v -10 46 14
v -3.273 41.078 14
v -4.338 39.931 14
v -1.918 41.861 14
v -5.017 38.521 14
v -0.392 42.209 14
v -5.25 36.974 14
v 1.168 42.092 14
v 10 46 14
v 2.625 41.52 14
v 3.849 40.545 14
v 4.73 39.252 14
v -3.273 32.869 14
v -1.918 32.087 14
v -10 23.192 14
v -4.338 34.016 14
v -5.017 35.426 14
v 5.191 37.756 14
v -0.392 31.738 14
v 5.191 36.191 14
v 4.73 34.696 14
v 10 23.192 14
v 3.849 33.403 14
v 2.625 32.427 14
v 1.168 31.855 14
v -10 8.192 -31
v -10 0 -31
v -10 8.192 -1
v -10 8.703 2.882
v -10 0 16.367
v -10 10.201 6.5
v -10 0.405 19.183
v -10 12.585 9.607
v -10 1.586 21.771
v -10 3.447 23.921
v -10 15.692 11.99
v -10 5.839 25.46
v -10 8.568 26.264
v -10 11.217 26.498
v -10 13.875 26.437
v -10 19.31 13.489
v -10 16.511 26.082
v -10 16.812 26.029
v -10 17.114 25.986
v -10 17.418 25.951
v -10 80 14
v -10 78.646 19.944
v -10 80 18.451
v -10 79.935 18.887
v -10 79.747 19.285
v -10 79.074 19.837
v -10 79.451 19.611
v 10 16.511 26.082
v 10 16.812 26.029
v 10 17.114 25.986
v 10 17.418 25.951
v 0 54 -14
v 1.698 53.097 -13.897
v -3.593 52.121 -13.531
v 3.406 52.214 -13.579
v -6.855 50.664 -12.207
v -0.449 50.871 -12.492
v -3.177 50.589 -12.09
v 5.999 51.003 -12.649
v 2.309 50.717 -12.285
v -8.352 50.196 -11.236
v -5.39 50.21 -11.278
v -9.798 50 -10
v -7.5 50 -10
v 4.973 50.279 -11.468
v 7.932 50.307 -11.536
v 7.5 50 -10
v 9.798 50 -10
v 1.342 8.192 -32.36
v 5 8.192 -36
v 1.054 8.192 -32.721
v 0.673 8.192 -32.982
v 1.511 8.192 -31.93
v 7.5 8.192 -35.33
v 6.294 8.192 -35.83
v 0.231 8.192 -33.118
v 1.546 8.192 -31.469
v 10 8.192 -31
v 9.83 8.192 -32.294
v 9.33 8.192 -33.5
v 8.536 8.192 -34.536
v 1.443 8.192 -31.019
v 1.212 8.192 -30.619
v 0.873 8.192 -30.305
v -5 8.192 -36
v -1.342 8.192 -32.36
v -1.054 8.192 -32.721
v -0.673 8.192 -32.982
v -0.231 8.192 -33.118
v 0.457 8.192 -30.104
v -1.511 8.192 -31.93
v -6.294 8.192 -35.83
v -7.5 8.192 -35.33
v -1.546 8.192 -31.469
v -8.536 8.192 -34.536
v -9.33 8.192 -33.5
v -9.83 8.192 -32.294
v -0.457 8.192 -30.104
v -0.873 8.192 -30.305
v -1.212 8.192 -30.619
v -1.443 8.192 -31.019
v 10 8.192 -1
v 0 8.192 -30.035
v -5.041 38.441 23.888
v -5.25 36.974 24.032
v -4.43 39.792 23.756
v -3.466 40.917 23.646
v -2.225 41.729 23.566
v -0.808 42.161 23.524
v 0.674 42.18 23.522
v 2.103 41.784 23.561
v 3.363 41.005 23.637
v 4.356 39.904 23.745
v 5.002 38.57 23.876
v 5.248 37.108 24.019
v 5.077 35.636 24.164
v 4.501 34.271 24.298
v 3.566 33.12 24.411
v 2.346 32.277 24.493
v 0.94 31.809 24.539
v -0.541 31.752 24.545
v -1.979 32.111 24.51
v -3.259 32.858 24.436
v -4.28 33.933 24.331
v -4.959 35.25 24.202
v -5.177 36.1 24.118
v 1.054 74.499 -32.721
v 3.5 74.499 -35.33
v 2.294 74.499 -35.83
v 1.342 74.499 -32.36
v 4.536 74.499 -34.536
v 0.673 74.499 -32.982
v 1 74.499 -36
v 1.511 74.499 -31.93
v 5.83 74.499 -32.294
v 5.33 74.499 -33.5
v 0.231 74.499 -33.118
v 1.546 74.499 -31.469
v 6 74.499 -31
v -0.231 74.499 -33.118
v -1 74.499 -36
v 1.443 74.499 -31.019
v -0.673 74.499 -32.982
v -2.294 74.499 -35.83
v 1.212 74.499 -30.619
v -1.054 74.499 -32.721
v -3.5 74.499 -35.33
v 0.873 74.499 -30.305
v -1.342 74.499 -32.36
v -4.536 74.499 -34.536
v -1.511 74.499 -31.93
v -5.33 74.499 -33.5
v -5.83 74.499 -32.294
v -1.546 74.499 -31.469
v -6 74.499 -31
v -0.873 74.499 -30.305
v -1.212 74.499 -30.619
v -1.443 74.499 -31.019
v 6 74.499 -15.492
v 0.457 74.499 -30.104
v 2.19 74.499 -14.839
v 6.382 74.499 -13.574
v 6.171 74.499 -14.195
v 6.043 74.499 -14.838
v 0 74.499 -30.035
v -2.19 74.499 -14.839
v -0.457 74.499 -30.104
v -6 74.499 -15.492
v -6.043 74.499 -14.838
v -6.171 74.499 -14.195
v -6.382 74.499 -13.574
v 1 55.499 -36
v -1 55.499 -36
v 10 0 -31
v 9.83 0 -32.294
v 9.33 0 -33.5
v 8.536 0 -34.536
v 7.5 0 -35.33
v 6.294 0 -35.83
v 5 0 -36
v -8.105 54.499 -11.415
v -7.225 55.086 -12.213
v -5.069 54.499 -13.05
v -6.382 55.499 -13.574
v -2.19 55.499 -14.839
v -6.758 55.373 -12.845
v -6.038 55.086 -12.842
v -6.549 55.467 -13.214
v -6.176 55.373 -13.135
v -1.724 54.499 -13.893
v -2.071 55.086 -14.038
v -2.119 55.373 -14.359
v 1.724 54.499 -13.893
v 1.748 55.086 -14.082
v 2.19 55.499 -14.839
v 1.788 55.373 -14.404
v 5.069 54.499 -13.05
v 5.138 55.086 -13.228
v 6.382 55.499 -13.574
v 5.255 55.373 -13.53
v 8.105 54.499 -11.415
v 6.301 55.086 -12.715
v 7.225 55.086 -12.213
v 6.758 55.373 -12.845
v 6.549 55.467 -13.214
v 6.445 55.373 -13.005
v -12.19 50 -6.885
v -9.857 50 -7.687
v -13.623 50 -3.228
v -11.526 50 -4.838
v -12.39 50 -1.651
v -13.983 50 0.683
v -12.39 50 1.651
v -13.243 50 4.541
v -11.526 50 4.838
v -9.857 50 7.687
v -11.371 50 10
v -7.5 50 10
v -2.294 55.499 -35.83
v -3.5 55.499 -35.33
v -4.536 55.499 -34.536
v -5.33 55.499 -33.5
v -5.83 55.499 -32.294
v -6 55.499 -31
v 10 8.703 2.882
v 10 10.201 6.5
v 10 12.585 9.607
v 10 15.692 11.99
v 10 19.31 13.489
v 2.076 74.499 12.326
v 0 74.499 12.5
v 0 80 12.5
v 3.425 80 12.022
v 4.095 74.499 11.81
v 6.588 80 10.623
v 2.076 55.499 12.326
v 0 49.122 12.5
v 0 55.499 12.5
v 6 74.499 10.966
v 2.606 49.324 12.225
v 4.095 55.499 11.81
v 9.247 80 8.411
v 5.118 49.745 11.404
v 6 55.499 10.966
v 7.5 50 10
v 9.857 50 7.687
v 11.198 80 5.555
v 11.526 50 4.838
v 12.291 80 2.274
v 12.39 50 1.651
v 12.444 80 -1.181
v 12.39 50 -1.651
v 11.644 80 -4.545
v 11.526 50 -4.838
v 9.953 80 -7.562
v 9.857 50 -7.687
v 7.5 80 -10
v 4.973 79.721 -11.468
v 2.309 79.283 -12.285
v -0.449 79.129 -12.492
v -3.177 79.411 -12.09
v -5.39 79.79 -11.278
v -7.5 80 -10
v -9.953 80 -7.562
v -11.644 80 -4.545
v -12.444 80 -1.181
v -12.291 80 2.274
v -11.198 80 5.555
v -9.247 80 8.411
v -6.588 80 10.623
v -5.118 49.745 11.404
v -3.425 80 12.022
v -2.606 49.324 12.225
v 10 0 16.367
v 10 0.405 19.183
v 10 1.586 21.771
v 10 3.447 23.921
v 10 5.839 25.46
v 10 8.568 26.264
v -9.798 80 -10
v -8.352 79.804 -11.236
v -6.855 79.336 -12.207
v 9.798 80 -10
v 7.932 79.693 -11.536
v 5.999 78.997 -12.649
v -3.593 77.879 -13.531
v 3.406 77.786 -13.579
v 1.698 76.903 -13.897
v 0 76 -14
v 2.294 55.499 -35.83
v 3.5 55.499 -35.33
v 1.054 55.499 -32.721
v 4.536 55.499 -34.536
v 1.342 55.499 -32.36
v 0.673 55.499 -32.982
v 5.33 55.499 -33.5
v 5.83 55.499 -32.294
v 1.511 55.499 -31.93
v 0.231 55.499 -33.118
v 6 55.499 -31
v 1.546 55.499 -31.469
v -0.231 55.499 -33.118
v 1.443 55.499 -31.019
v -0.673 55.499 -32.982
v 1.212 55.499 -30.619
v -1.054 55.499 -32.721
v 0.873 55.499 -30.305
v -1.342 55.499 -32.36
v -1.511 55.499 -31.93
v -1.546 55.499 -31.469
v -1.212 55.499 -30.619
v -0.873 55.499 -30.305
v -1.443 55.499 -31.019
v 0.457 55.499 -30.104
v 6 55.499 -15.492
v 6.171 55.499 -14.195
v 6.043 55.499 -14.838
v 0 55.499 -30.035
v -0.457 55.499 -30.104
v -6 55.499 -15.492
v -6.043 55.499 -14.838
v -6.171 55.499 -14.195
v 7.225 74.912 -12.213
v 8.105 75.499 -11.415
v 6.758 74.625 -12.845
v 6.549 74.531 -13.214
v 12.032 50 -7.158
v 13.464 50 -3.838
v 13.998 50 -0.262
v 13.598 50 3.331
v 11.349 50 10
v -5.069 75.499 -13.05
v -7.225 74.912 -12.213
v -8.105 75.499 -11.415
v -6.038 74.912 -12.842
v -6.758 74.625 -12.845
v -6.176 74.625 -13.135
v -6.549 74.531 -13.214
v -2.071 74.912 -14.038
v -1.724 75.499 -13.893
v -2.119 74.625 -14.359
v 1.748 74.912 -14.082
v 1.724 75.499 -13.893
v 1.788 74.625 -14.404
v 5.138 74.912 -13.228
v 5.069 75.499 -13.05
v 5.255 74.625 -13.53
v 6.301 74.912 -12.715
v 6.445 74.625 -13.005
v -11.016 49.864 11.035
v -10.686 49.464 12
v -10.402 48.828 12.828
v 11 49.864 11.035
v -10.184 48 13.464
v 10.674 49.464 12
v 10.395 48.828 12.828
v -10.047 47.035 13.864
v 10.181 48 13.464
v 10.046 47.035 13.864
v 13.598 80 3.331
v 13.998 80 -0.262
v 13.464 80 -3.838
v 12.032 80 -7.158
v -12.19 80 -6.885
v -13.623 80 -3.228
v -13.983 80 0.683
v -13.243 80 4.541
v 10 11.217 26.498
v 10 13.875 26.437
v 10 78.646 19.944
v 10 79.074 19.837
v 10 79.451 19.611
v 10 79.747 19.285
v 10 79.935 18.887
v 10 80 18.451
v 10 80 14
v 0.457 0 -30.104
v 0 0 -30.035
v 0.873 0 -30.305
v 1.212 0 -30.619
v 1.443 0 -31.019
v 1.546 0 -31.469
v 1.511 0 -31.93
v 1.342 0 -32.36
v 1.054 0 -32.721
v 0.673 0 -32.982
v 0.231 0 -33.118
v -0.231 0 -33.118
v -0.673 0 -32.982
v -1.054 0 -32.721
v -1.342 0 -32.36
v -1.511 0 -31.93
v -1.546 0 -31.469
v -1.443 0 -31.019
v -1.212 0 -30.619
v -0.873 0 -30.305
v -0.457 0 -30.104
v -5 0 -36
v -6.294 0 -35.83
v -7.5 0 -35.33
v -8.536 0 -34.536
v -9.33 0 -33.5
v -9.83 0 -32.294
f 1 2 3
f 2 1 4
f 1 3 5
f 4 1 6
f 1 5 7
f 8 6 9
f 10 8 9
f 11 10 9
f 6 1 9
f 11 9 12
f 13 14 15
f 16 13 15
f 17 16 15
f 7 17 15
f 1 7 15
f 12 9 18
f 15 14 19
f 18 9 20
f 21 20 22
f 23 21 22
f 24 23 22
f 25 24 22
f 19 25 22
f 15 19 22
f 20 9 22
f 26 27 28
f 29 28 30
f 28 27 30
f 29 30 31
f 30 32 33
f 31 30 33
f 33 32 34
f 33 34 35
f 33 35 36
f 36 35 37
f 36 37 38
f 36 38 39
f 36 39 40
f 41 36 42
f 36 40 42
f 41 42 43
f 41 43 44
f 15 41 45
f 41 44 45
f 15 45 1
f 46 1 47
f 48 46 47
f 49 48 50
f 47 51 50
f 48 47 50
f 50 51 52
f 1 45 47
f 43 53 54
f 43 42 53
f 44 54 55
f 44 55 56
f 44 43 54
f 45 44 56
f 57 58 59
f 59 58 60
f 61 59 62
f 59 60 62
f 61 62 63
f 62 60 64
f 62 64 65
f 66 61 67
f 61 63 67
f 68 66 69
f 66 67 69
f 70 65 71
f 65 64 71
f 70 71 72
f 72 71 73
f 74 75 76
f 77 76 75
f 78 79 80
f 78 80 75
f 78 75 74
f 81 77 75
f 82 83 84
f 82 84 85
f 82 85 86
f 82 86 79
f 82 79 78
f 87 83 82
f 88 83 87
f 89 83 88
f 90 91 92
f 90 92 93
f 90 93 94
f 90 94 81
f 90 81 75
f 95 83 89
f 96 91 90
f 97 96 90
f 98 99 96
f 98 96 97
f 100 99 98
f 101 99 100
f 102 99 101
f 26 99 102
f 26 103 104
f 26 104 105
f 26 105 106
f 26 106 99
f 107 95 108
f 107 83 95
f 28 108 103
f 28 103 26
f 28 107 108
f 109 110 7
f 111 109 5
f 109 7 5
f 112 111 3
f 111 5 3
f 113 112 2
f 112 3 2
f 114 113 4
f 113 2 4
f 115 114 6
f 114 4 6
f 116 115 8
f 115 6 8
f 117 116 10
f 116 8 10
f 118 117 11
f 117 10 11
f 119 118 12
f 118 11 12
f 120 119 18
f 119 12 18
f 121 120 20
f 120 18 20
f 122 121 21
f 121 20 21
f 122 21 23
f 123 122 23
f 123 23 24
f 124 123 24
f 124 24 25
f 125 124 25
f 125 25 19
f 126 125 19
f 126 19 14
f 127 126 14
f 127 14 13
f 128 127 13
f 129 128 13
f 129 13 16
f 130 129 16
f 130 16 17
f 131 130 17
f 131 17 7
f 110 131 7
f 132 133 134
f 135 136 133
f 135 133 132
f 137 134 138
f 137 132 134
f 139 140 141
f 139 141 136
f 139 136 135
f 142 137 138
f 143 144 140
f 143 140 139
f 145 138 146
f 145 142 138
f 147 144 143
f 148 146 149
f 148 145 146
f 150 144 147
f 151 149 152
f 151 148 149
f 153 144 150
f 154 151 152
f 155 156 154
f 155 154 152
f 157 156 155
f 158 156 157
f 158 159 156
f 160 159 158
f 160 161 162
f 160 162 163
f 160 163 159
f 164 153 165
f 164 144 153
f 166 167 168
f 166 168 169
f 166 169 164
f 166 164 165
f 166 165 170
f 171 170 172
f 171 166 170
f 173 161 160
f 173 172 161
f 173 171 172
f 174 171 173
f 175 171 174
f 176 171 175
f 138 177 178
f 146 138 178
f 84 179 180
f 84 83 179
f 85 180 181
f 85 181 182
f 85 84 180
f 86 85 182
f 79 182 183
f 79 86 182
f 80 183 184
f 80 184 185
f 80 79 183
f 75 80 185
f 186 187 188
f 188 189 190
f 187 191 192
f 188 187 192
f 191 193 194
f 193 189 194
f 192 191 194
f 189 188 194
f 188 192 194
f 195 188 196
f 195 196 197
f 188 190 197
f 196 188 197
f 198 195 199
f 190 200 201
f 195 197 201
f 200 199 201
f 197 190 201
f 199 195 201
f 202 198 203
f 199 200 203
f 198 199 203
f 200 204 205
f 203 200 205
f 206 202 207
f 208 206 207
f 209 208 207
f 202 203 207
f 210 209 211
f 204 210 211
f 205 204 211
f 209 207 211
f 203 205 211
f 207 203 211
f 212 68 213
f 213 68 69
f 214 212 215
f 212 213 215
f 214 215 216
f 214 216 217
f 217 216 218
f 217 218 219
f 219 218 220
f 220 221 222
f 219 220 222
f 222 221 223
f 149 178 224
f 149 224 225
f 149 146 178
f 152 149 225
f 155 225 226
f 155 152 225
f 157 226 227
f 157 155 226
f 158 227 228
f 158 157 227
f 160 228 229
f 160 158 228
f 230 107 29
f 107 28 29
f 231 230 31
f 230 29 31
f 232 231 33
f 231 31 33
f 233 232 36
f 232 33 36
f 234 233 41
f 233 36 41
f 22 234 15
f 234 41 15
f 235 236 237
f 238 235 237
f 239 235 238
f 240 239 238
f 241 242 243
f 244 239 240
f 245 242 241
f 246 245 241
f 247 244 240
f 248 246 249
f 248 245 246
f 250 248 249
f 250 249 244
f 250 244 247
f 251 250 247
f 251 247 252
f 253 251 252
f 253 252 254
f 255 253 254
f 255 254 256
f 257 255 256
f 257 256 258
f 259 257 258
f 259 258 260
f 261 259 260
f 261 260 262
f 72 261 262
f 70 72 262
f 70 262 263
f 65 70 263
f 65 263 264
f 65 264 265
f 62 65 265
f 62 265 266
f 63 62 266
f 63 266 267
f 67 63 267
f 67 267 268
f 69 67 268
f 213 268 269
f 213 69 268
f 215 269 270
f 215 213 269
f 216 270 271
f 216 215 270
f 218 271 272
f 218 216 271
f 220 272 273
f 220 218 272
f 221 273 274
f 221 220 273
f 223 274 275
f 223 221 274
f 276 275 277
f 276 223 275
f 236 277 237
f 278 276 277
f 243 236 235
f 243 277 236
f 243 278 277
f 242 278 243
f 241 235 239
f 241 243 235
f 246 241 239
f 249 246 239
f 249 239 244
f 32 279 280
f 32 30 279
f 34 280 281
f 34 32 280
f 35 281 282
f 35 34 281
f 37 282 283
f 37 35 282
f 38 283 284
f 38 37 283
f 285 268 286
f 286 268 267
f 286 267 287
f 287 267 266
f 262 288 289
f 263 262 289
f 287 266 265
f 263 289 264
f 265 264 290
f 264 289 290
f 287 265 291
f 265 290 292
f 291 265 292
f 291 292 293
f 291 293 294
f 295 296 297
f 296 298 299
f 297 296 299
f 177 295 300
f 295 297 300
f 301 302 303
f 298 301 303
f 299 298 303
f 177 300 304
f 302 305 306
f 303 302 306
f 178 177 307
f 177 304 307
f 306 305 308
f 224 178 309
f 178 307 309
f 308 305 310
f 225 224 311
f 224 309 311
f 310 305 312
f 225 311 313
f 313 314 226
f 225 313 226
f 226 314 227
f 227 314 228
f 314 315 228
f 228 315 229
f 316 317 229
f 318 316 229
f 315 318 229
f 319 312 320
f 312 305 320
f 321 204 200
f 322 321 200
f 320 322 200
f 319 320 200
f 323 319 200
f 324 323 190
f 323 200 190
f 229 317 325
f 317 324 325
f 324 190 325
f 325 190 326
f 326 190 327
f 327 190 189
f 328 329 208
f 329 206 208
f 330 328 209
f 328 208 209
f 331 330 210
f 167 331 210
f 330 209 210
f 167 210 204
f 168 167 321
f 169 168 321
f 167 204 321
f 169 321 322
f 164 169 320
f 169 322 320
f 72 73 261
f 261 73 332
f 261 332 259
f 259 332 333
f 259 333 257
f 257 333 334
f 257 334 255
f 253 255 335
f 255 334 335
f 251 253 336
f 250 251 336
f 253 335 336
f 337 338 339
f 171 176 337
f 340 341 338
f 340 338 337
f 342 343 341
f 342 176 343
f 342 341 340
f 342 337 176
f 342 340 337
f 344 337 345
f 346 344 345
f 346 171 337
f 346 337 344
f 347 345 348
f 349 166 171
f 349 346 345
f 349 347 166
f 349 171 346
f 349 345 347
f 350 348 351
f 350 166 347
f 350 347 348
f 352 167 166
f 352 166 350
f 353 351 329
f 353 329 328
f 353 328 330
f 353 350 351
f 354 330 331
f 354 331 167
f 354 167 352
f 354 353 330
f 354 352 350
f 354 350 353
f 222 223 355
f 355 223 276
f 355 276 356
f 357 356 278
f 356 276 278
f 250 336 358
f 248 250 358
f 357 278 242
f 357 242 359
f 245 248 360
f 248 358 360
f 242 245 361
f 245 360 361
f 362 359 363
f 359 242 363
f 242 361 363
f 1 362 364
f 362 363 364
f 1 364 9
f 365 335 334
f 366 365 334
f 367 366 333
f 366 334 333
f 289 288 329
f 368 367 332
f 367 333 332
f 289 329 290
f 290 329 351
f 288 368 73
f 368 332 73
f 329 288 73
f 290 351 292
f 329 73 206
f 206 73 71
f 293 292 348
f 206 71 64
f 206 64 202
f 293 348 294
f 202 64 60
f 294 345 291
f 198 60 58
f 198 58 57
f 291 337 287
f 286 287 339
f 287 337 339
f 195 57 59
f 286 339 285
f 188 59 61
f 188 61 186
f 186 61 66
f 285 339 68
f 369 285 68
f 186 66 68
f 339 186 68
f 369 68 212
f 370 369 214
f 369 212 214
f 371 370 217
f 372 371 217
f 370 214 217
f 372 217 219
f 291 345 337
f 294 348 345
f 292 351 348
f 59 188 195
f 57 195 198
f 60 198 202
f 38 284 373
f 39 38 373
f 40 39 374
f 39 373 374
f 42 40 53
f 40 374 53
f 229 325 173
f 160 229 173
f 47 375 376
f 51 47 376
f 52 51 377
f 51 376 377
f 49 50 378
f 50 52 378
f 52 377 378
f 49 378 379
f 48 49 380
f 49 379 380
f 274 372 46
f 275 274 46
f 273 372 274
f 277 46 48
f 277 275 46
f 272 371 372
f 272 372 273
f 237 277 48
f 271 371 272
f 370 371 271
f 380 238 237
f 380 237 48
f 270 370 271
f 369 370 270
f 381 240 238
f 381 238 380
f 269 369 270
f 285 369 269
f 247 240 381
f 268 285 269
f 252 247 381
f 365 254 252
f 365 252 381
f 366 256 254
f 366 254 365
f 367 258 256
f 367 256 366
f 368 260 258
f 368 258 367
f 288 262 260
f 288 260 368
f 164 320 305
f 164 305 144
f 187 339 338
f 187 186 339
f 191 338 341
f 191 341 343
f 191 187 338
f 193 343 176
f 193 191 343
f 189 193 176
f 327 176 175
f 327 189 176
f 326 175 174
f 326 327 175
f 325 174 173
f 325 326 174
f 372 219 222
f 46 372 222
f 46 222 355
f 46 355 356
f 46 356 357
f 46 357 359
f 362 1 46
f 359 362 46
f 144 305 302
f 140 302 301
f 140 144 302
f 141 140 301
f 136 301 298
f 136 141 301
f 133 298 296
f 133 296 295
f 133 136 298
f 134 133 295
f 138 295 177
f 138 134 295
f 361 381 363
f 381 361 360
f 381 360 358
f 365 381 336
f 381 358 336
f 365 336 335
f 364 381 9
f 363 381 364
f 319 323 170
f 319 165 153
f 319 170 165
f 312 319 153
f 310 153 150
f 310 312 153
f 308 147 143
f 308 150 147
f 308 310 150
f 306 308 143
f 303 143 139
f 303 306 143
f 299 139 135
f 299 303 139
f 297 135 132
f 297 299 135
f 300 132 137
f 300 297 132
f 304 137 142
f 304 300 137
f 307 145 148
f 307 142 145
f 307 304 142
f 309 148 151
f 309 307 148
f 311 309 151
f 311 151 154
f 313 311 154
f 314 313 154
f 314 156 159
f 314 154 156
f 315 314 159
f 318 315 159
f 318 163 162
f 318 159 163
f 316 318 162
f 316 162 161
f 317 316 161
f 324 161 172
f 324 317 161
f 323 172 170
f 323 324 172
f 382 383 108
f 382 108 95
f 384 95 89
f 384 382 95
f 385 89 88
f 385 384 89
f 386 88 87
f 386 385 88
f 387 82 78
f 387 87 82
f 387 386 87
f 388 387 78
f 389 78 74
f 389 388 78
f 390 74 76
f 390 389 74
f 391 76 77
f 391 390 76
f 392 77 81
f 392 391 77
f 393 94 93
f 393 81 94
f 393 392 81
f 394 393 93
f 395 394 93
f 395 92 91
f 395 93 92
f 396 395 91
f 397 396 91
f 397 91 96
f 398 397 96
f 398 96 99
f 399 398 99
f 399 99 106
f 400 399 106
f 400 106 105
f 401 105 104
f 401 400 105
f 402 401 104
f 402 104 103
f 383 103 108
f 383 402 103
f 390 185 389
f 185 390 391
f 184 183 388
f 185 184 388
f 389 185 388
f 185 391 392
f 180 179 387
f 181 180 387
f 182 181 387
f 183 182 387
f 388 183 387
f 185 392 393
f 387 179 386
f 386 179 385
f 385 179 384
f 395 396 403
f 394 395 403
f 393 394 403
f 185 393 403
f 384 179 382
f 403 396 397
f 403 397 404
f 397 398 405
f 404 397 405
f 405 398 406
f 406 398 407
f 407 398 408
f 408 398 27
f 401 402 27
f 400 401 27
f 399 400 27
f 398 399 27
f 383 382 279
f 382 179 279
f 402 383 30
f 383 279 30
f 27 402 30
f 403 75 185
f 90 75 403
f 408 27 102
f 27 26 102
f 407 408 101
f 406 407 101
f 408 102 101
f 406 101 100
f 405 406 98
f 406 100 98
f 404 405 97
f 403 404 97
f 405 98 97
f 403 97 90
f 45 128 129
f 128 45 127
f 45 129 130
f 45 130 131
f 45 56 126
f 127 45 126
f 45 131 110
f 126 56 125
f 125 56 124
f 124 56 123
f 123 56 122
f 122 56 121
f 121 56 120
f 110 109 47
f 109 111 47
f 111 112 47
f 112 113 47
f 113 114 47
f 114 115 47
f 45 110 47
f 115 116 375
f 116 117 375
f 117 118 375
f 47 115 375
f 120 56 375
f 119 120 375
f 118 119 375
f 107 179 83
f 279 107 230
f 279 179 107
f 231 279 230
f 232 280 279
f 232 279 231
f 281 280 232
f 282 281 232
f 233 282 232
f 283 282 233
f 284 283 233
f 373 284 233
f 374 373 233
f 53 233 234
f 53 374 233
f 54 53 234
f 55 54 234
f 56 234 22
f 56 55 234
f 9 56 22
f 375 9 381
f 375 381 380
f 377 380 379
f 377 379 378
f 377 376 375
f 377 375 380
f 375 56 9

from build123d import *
from OCP.BRepFilletAPI import BRepFilletAPI_MakeFillet

# Parameters (mm, degrees)
SKETCH1_R               = 12.5
BOSS_EXTRUDE1_DEPTH     = 80
CUT_EXTRUDE1_DEPTH      = 88.77439656
CUT_EXTRUDE1_DEPTH_BACK = 88.77439656
SKETCH4_OUTSIDE_W       = 61.818
SKETCH4_OUTSIDE_H       = 100.83
SKETCH6_W               = 20
SKETCH6_H               = 8.19180338
SKETCH6_W_2             = 12
SKETCH6_H_2             = 19
BOSS_EXTRUDE3_DEPTH     = 50
CUT_EXTRUDE2_START      = -30
SKETCH8_R               = 12.5
CUT_EXTRUDE2_DEPTH      = 30
FILLET1_R               = 5
FILLET2_R               = 15
FILLET3_R1              = 1
FILLET3_R2              = 5
CUT_EXTRUDE4_DEPTH      = 84.91706908
CUT_EXTRUDE4_DEPTH_BACK = 84.91706908
SKETCH11_R              = 1.55
FILLET4_R               = 10
SKETCH12_R              = 5.25
CUT_EXTRUDE5_DEPTH      = 96.372952239


with BuildPart() as part:
    # Sketch1 → Boss-Extrude1 (new body)
    with BuildSketch(Plane(origin=(0, 0, 0), x_dir=(1, 0, 0), z_dir=(0, 1, 0))):
        with BuildLine():
            Line((-13.243243243, -4.540540541), (-10, -14))
            Line((-10, -14), (-10, -26.98786193))
            Line((-10, -26.98786193), (10, -26.98786193))
            Line((10, -26.98786193), (10, -14))
            Line((10, -14), (13.597983435, -3.330892747))
            ThreePointArc((13.597983435, -3.330892747), (-0.630295246, 13.985804514), (-13.243243243, -4.540540541))
        make_face()
        with Locations(Location((0, 0, 0), (0, 0, 270))):
            Circle(SKETCH1_R, mode=Mode.SUBTRACT)
    extrude(amount=BOSS_EXTRUDE1_DEPTH)

    # Sketch4 outside → Cut-Extrude1 (cut, two sides: drawn at the far end of the back side and taken through both)
    with BuildSketch(Plane.ZY.offset(10).offset(-CUT_EXTRUDE1_DEPTH_BACK)):
        with Locations((6.494, 40)):
            Rectangle(SKETCH4_OUTSIDE_W, SKETCH4_OUTSIDE_H)
        with BuildLine():
            Line((-10, 50), (10, 50))
            ThreePointArc((10, 50), (12.828427125, 48.828427125), (14, 46))
            Line((14, 46), (14, 0))
            Line((14, 0), (23.289589956, 0))
            ThreePointArc((23.289589956, 0), (26.209542913, 8.210116535), (25.999737715, 16.921495334))
            Line((25.999737715, 16.921495334), (19.944041303, 78.646458452))
            ThreePointArc((19.944041303, 78.646458452), (19.458758034, 79.611235276), (18.451208451, 80))
            Line((18.451208451, 80), (14, 80))
            Line((14, 80), (-10, 80))
            ThreePointArc((-10, 80), (-12.828427125, 78.828427125), (-14, 76))
            Line((-14, 76), (-14, 54))
            ThreePointArc((-14, 54), (-12.828427125, 51.171572875), (-10, 50))
        make_face(mode=Mode.SUBTRACT)
    extrude(amount=CUT_EXTRUDE1_DEPTH + CUT_EXTRUDE1_DEPTH_BACK, mode=Mode.SUBTRACT)

    # Sketch6 → Boss-Extrude3 (add)
    with BuildSketch(Plane(origin=(0, 0, 14), x_dir=(-1, 0, 0), z_dir=(0, 0, -1))):
        with Locations((0, 4.09590169)):
            Rectangle(SKETCH6_W, SKETCH6_H)
        with Locations((0, 64.998822006)):
            Rectangle(SKETCH6_W_2, SKETCH6_H_2)
    extrude(amount=BOSS_EXTRUDE3_DEPTH)

    # Sketch8 → Cut-Extrude2 (cut)
    with BuildSketch(Plane(origin=(0, 80, 0), x_dir=(1, 0, 0), z_dir=(0, 1, 0)).offset(CUT_EXTRUDE2_START)):
        with Locations(Location((0, 0, 0), (0, 0, 53.130102354))):
            Circle(SKETCH8_R)
    extrude(amount=CUT_EXTRUDE2_DEPTH, mode=Mode.SUBTRACT)

    # Fillet1
    fillet1_edges = [part.edges().sort_by_distance(p)[0] for p in [
        (10, 4.09590169, -36),
        (-10, 4.09590169, -36),
        (6, 64.998822006, -36),
        (-6, 64.998822006, -36),
    ]]
    fillet(fillet1_edges, radius=FILLET1_R)

    # Fillet2
    fillet2_edges = [part.edges().sort_by_distance(p)[0] for p in [
        (0, 8.19180338, 14),
    ]]
    fillet(fillet2_edges, radius=FILLET2_R)

    # Fillet3: one fillet with a radius per group of edges: ONE call of the kernel's fillet builder (fillet() takes one radius for all edges)
    fillet3_edges_1 = [part.edges().sort_by_distance(p)[0] for p in [
        (0, 74.498822006, -14),
        (0, 55.498822006, -14),
    ]]
    fillet3_edges_2 = [part.edges().sort_by_distance(p)[0] for p in [
        (-6, 64.998822006, -12.649110641),
        (6, 64.998822006, -12.649110641),
    ]]
    fillet3 = BRepFilletAPI_MakeFillet(part.part.solid().wrapped)
    for e in fillet3_edges_1:
        fillet3.Add(FILLET3_R1, e.wrapped)
    for e in fillet3_edges_2:
        fillet3.Add(FILLET3_R2, e.wrapped)
    add(Compound.cast(fillet3.Shape()), mode=Mode.REPLACE)

    # Sketch11 → Cut-Extrude4 (cut, two sides: drawn at the far end of the back side and taken through both)
    with BuildSketch(Plane(origin=(0, 74.498822006, 0), x_dir=(1, 0, 0), z_dir=(0, 1, 0)).offset(-CUT_EXTRUDE4_DEPTH_BACK)):
        with Locations(Location((0, 31.585251235, 0), (0, 0, 270))):
            Circle(SKETCH11_R)
    extrude(amount=CUT_EXTRUDE4_DEPTH + CUT_EXTRUDE4_DEPTH_BACK, mode=Mode.SUBTRACT)

    # Fillet4
    fillet4_edges = [part.edges().sort_by_distance(p)[0] for p in [
        (0, 16.921495334, 25.999737715),
        (0, 0, 23.289589956),
    ]]
    fillet(fillet4_edges, radius=FILLET4_R)

    # Sketch12 → Cut-Extrude5 (cut, through all)
    with BuildSketch(Plane(origin=(0, 0, 14), x_dir=(-1, 0, 0), z_dir=(0, 0, -1))):
        with Locations((0, 36.973808643)):
            Circle(SKETCH12_R)
    extrude(amount=-CUT_EXTRUDE5_DEPTH, mode=Mode.SUBTRACT)


solid = part.part
